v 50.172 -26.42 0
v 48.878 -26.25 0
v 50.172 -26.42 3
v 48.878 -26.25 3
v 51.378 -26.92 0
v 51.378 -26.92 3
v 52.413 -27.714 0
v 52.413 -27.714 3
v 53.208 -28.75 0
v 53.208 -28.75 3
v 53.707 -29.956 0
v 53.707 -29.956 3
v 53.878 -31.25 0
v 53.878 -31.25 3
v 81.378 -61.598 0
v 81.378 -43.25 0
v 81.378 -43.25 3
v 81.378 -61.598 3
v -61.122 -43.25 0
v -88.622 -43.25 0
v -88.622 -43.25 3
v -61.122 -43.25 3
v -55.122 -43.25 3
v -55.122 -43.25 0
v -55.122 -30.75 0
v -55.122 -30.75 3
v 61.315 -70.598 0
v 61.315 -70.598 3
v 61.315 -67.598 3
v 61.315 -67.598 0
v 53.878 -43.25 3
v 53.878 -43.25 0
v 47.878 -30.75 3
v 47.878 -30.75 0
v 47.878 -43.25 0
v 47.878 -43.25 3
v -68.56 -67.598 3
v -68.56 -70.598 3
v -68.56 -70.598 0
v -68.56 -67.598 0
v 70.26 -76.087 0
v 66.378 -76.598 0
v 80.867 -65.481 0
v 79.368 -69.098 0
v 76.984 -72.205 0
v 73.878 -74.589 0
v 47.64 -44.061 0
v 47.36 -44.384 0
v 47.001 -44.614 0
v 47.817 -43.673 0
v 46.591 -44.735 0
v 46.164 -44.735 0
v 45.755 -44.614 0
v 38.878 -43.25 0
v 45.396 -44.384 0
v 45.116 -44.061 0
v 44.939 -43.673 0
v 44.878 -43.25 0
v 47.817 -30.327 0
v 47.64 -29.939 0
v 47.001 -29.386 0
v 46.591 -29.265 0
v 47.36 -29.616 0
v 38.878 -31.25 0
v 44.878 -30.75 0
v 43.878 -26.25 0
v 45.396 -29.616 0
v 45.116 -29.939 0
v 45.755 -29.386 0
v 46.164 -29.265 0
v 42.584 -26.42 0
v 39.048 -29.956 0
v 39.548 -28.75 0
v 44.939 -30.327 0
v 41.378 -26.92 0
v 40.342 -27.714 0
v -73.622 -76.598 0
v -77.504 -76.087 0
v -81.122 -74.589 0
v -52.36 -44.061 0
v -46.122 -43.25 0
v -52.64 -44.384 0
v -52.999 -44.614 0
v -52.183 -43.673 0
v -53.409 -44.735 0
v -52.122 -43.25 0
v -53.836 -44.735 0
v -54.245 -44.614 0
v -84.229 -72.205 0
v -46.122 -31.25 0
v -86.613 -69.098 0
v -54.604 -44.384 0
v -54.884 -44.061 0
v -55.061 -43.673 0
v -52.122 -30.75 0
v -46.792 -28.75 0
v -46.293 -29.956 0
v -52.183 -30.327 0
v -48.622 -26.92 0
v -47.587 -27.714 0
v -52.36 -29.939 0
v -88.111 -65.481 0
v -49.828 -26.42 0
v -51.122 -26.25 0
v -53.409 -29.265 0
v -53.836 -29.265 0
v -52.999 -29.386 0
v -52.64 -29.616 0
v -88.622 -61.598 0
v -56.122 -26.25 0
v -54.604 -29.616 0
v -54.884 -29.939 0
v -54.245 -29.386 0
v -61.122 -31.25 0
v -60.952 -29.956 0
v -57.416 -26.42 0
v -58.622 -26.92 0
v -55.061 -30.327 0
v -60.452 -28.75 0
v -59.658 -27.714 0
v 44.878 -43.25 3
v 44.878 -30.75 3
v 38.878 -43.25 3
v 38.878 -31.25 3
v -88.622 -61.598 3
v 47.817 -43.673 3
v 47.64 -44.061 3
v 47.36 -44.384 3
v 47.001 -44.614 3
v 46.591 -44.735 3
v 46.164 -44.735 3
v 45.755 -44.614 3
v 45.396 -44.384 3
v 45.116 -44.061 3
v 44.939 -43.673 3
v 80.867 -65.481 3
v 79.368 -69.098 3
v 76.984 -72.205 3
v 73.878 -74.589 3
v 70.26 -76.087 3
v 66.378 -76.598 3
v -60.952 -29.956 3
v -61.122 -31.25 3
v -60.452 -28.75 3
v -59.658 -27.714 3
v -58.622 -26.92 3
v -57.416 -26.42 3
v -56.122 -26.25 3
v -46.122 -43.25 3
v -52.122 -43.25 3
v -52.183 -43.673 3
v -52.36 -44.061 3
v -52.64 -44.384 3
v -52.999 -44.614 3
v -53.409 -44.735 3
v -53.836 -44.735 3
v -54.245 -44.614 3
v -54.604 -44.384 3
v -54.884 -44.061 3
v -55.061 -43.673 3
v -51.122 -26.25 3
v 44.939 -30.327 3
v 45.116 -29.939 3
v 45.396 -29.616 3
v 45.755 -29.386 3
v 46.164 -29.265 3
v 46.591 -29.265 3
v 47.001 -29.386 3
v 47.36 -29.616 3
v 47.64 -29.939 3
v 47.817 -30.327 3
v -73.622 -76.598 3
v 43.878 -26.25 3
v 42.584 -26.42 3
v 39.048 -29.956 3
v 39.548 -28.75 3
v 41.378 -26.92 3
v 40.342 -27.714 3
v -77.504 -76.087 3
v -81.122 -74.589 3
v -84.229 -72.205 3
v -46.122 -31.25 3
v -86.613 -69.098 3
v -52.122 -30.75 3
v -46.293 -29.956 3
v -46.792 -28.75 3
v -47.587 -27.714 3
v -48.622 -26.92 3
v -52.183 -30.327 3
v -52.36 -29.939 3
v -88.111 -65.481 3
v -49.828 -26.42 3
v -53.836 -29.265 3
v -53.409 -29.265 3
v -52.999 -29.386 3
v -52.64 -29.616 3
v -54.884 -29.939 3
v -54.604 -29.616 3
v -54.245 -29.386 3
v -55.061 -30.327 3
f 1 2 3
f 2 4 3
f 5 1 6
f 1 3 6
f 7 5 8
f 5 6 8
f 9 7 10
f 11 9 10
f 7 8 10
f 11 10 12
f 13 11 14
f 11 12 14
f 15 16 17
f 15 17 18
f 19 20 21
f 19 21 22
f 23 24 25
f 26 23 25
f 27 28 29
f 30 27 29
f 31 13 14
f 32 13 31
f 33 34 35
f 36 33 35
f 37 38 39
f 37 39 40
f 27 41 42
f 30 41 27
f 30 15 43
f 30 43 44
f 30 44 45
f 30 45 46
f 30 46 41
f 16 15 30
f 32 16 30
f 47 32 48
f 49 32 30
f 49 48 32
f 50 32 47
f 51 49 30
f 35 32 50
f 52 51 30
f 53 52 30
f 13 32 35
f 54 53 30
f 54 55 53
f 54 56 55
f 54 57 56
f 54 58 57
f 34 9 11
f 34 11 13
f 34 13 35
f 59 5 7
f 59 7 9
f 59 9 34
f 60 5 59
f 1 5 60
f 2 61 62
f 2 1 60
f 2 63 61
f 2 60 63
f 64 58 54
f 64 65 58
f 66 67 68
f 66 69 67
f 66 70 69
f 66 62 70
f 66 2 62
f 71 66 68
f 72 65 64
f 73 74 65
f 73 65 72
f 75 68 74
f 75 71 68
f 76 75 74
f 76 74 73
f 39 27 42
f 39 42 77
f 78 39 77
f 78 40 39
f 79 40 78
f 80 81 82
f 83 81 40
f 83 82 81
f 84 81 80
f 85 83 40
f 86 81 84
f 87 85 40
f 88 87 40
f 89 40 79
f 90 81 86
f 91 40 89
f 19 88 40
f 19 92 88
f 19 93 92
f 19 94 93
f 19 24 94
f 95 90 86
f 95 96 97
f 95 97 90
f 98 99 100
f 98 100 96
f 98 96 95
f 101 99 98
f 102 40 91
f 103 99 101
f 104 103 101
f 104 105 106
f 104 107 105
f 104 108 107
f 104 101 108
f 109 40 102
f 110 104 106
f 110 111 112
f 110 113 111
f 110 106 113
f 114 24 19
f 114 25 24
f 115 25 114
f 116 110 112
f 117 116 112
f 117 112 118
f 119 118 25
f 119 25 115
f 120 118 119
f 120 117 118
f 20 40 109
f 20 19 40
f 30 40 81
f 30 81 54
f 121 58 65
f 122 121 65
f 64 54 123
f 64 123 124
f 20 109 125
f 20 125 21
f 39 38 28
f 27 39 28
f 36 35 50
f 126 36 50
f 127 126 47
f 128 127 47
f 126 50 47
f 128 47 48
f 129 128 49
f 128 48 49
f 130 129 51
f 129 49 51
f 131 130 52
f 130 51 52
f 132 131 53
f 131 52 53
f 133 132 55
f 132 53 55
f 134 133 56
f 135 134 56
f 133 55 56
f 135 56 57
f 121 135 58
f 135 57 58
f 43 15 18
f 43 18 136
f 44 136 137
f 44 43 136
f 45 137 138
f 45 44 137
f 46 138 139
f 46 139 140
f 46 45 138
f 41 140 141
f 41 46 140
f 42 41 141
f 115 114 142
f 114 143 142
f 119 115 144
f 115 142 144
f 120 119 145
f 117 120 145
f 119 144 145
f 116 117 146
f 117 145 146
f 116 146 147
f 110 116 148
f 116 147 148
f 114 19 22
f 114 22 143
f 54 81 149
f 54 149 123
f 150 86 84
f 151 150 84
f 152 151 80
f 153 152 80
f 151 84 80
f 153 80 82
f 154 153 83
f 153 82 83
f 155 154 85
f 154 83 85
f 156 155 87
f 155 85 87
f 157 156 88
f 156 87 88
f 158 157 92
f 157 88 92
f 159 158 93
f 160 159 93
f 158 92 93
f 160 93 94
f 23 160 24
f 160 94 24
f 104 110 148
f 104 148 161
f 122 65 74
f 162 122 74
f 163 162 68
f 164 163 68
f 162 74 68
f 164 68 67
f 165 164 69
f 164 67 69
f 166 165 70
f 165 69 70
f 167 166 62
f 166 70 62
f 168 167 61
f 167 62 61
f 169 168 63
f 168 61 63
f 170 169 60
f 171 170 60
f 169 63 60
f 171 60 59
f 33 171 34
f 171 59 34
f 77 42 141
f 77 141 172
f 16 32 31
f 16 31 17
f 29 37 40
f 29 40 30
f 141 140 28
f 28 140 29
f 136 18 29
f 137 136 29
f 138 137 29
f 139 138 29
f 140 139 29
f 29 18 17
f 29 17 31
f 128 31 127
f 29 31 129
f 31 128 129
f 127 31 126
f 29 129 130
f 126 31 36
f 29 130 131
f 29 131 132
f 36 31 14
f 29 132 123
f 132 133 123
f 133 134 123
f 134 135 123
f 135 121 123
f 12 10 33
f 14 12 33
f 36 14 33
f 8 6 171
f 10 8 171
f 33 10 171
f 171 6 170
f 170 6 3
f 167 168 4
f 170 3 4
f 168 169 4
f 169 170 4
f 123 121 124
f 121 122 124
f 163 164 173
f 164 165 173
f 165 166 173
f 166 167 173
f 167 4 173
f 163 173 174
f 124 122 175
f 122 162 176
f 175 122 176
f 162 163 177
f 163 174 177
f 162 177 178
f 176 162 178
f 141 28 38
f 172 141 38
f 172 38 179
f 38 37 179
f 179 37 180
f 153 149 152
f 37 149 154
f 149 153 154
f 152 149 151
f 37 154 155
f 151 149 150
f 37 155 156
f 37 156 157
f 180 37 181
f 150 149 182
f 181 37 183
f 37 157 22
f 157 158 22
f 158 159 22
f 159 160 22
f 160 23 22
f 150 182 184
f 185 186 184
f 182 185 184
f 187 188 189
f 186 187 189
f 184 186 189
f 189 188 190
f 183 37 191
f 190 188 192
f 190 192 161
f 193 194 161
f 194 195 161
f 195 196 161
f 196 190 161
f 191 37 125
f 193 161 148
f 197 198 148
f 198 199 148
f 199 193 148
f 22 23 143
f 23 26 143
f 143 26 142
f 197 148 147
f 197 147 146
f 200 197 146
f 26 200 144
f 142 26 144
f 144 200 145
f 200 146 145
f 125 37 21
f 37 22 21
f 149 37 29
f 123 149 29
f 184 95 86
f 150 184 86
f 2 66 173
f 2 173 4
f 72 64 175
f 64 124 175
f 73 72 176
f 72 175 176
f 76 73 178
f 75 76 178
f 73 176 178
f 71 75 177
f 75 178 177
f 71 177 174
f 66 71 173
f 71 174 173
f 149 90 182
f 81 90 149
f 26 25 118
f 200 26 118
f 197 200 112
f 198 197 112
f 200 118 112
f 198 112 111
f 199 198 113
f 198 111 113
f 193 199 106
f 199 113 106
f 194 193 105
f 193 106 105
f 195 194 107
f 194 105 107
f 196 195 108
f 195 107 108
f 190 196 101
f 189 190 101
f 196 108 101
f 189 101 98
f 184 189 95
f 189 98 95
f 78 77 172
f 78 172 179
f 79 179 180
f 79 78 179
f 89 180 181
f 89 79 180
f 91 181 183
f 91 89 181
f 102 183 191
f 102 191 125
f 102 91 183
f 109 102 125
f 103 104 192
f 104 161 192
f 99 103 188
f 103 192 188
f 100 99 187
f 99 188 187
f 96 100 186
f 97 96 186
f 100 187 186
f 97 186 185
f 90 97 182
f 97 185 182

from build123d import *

# Parameters (mm, degrees)
BOSS_EXTRUDE1_DEPTH = 3
FILLET2_R           = 5
SKETCH2_W           = 129.874983815
SKETCH2_H           = 3
CUT_EXTRUDE1_DEPTH  = 10


with BuildPart() as part:
    # Sketch1 → Boss-Extrude1 (new body)
    with BuildSketch(Plane.XY):
        with BuildLine():
            Line((-88.622208542, -43.25), (-61.122208542, -43.25))
            Line((-61.122208542, -43.25), (-61.122208542, -26.25))
            Line((-61.122208542, -26.25), (-46.122208542, -26.25))
            Line((-46.122208542, -26.25), (-46.122208542, -43.25))
            Line((-46.122208542, -43.25), (38.877791458, -43.25))
            Line((38.877791458, -43.25), (38.877791458, -26.25))
            Line((38.877791458, -26.25), (53.877791458, -26.25))
            Line((53.877791458, -26.25), (53.877791458, -43.25))
            Line((53.877791458, -43.25), (81.377791458, -43.25))
            Line((81.377791458, -43.25), (81.377791458, -61.598486101))
            ThreePointArc((81.377791458, -61.598486101), (76.984393176, -72.205087819), (66.377791458, -76.598486101))
            Line((66.377791458, -76.598486101), (-73.622208542, -76.598486101))
            ThreePointArc((-73.622208542, -76.598486101), (-84.228810259, -72.205087819), (-88.622208542, -61.598486101))
            Line((-88.622208542, -61.598486101), (-88.622208542, -43.25))
        make_face()
        with BuildLine():
            Line((-55.122208542, -43.25), (-55.122208542, -30.75))
            ThreePointArc((-55.122208542, -30.75), (-53.622208542, -29.25), (-52.122208542, -30.75))
            Line((-52.122208542, -30.75), (-52.122208542, -43.25))
            ThreePointArc((-52.122208542, -43.25), (-53.622208542, -44.75), (-55.122208542, -43.25))
        make_face(mode=Mode.SUBTRACT)
        with BuildLine():
            Line((44.877791458, -43.25), (44.877791458, -30.75))
            ThreePointArc((44.877791458, -30.75), (46.377791458, -29.25), (47.877791458, -30.75))
            Line((47.877791458, -30.75), (47.877791458, -43.25))
            ThreePointArc((47.877791458, -43.25), (46.377791458, -44.75), (44.877791458, -43.25))
        make_face(mode=Mode.SUBTRACT)
    extrude(amount=BOSS_EXTRUDE1_DEPTH)

    # Fillet2
    fillet2_edges = [part.edges().sort_by_distance(p)[0] for p in [
        (-61.122208542, -26.25, 1.5),
        (-46.122208542, -26.25, 1.5),
        (38.877791458, -26.25, 1.5),
        (53.877791458, -26.25, 1.5),
    ]]
    fillet(fillet2_edges, radius=FILLET2_R)

    # Sketch2 → Cut-Extrude1 (cut)
    with BuildSketch(Plane.XY.offset(3)):
        with Locations((-3.622208542, -69.098486101)):
            Rectangle(SKETCH2_W, SKETCH2_H)
    extrude(amount=-CUT_EXTRUDE1_DEPTH, mode=Mode.SUBTRACT)


solid = part.part
